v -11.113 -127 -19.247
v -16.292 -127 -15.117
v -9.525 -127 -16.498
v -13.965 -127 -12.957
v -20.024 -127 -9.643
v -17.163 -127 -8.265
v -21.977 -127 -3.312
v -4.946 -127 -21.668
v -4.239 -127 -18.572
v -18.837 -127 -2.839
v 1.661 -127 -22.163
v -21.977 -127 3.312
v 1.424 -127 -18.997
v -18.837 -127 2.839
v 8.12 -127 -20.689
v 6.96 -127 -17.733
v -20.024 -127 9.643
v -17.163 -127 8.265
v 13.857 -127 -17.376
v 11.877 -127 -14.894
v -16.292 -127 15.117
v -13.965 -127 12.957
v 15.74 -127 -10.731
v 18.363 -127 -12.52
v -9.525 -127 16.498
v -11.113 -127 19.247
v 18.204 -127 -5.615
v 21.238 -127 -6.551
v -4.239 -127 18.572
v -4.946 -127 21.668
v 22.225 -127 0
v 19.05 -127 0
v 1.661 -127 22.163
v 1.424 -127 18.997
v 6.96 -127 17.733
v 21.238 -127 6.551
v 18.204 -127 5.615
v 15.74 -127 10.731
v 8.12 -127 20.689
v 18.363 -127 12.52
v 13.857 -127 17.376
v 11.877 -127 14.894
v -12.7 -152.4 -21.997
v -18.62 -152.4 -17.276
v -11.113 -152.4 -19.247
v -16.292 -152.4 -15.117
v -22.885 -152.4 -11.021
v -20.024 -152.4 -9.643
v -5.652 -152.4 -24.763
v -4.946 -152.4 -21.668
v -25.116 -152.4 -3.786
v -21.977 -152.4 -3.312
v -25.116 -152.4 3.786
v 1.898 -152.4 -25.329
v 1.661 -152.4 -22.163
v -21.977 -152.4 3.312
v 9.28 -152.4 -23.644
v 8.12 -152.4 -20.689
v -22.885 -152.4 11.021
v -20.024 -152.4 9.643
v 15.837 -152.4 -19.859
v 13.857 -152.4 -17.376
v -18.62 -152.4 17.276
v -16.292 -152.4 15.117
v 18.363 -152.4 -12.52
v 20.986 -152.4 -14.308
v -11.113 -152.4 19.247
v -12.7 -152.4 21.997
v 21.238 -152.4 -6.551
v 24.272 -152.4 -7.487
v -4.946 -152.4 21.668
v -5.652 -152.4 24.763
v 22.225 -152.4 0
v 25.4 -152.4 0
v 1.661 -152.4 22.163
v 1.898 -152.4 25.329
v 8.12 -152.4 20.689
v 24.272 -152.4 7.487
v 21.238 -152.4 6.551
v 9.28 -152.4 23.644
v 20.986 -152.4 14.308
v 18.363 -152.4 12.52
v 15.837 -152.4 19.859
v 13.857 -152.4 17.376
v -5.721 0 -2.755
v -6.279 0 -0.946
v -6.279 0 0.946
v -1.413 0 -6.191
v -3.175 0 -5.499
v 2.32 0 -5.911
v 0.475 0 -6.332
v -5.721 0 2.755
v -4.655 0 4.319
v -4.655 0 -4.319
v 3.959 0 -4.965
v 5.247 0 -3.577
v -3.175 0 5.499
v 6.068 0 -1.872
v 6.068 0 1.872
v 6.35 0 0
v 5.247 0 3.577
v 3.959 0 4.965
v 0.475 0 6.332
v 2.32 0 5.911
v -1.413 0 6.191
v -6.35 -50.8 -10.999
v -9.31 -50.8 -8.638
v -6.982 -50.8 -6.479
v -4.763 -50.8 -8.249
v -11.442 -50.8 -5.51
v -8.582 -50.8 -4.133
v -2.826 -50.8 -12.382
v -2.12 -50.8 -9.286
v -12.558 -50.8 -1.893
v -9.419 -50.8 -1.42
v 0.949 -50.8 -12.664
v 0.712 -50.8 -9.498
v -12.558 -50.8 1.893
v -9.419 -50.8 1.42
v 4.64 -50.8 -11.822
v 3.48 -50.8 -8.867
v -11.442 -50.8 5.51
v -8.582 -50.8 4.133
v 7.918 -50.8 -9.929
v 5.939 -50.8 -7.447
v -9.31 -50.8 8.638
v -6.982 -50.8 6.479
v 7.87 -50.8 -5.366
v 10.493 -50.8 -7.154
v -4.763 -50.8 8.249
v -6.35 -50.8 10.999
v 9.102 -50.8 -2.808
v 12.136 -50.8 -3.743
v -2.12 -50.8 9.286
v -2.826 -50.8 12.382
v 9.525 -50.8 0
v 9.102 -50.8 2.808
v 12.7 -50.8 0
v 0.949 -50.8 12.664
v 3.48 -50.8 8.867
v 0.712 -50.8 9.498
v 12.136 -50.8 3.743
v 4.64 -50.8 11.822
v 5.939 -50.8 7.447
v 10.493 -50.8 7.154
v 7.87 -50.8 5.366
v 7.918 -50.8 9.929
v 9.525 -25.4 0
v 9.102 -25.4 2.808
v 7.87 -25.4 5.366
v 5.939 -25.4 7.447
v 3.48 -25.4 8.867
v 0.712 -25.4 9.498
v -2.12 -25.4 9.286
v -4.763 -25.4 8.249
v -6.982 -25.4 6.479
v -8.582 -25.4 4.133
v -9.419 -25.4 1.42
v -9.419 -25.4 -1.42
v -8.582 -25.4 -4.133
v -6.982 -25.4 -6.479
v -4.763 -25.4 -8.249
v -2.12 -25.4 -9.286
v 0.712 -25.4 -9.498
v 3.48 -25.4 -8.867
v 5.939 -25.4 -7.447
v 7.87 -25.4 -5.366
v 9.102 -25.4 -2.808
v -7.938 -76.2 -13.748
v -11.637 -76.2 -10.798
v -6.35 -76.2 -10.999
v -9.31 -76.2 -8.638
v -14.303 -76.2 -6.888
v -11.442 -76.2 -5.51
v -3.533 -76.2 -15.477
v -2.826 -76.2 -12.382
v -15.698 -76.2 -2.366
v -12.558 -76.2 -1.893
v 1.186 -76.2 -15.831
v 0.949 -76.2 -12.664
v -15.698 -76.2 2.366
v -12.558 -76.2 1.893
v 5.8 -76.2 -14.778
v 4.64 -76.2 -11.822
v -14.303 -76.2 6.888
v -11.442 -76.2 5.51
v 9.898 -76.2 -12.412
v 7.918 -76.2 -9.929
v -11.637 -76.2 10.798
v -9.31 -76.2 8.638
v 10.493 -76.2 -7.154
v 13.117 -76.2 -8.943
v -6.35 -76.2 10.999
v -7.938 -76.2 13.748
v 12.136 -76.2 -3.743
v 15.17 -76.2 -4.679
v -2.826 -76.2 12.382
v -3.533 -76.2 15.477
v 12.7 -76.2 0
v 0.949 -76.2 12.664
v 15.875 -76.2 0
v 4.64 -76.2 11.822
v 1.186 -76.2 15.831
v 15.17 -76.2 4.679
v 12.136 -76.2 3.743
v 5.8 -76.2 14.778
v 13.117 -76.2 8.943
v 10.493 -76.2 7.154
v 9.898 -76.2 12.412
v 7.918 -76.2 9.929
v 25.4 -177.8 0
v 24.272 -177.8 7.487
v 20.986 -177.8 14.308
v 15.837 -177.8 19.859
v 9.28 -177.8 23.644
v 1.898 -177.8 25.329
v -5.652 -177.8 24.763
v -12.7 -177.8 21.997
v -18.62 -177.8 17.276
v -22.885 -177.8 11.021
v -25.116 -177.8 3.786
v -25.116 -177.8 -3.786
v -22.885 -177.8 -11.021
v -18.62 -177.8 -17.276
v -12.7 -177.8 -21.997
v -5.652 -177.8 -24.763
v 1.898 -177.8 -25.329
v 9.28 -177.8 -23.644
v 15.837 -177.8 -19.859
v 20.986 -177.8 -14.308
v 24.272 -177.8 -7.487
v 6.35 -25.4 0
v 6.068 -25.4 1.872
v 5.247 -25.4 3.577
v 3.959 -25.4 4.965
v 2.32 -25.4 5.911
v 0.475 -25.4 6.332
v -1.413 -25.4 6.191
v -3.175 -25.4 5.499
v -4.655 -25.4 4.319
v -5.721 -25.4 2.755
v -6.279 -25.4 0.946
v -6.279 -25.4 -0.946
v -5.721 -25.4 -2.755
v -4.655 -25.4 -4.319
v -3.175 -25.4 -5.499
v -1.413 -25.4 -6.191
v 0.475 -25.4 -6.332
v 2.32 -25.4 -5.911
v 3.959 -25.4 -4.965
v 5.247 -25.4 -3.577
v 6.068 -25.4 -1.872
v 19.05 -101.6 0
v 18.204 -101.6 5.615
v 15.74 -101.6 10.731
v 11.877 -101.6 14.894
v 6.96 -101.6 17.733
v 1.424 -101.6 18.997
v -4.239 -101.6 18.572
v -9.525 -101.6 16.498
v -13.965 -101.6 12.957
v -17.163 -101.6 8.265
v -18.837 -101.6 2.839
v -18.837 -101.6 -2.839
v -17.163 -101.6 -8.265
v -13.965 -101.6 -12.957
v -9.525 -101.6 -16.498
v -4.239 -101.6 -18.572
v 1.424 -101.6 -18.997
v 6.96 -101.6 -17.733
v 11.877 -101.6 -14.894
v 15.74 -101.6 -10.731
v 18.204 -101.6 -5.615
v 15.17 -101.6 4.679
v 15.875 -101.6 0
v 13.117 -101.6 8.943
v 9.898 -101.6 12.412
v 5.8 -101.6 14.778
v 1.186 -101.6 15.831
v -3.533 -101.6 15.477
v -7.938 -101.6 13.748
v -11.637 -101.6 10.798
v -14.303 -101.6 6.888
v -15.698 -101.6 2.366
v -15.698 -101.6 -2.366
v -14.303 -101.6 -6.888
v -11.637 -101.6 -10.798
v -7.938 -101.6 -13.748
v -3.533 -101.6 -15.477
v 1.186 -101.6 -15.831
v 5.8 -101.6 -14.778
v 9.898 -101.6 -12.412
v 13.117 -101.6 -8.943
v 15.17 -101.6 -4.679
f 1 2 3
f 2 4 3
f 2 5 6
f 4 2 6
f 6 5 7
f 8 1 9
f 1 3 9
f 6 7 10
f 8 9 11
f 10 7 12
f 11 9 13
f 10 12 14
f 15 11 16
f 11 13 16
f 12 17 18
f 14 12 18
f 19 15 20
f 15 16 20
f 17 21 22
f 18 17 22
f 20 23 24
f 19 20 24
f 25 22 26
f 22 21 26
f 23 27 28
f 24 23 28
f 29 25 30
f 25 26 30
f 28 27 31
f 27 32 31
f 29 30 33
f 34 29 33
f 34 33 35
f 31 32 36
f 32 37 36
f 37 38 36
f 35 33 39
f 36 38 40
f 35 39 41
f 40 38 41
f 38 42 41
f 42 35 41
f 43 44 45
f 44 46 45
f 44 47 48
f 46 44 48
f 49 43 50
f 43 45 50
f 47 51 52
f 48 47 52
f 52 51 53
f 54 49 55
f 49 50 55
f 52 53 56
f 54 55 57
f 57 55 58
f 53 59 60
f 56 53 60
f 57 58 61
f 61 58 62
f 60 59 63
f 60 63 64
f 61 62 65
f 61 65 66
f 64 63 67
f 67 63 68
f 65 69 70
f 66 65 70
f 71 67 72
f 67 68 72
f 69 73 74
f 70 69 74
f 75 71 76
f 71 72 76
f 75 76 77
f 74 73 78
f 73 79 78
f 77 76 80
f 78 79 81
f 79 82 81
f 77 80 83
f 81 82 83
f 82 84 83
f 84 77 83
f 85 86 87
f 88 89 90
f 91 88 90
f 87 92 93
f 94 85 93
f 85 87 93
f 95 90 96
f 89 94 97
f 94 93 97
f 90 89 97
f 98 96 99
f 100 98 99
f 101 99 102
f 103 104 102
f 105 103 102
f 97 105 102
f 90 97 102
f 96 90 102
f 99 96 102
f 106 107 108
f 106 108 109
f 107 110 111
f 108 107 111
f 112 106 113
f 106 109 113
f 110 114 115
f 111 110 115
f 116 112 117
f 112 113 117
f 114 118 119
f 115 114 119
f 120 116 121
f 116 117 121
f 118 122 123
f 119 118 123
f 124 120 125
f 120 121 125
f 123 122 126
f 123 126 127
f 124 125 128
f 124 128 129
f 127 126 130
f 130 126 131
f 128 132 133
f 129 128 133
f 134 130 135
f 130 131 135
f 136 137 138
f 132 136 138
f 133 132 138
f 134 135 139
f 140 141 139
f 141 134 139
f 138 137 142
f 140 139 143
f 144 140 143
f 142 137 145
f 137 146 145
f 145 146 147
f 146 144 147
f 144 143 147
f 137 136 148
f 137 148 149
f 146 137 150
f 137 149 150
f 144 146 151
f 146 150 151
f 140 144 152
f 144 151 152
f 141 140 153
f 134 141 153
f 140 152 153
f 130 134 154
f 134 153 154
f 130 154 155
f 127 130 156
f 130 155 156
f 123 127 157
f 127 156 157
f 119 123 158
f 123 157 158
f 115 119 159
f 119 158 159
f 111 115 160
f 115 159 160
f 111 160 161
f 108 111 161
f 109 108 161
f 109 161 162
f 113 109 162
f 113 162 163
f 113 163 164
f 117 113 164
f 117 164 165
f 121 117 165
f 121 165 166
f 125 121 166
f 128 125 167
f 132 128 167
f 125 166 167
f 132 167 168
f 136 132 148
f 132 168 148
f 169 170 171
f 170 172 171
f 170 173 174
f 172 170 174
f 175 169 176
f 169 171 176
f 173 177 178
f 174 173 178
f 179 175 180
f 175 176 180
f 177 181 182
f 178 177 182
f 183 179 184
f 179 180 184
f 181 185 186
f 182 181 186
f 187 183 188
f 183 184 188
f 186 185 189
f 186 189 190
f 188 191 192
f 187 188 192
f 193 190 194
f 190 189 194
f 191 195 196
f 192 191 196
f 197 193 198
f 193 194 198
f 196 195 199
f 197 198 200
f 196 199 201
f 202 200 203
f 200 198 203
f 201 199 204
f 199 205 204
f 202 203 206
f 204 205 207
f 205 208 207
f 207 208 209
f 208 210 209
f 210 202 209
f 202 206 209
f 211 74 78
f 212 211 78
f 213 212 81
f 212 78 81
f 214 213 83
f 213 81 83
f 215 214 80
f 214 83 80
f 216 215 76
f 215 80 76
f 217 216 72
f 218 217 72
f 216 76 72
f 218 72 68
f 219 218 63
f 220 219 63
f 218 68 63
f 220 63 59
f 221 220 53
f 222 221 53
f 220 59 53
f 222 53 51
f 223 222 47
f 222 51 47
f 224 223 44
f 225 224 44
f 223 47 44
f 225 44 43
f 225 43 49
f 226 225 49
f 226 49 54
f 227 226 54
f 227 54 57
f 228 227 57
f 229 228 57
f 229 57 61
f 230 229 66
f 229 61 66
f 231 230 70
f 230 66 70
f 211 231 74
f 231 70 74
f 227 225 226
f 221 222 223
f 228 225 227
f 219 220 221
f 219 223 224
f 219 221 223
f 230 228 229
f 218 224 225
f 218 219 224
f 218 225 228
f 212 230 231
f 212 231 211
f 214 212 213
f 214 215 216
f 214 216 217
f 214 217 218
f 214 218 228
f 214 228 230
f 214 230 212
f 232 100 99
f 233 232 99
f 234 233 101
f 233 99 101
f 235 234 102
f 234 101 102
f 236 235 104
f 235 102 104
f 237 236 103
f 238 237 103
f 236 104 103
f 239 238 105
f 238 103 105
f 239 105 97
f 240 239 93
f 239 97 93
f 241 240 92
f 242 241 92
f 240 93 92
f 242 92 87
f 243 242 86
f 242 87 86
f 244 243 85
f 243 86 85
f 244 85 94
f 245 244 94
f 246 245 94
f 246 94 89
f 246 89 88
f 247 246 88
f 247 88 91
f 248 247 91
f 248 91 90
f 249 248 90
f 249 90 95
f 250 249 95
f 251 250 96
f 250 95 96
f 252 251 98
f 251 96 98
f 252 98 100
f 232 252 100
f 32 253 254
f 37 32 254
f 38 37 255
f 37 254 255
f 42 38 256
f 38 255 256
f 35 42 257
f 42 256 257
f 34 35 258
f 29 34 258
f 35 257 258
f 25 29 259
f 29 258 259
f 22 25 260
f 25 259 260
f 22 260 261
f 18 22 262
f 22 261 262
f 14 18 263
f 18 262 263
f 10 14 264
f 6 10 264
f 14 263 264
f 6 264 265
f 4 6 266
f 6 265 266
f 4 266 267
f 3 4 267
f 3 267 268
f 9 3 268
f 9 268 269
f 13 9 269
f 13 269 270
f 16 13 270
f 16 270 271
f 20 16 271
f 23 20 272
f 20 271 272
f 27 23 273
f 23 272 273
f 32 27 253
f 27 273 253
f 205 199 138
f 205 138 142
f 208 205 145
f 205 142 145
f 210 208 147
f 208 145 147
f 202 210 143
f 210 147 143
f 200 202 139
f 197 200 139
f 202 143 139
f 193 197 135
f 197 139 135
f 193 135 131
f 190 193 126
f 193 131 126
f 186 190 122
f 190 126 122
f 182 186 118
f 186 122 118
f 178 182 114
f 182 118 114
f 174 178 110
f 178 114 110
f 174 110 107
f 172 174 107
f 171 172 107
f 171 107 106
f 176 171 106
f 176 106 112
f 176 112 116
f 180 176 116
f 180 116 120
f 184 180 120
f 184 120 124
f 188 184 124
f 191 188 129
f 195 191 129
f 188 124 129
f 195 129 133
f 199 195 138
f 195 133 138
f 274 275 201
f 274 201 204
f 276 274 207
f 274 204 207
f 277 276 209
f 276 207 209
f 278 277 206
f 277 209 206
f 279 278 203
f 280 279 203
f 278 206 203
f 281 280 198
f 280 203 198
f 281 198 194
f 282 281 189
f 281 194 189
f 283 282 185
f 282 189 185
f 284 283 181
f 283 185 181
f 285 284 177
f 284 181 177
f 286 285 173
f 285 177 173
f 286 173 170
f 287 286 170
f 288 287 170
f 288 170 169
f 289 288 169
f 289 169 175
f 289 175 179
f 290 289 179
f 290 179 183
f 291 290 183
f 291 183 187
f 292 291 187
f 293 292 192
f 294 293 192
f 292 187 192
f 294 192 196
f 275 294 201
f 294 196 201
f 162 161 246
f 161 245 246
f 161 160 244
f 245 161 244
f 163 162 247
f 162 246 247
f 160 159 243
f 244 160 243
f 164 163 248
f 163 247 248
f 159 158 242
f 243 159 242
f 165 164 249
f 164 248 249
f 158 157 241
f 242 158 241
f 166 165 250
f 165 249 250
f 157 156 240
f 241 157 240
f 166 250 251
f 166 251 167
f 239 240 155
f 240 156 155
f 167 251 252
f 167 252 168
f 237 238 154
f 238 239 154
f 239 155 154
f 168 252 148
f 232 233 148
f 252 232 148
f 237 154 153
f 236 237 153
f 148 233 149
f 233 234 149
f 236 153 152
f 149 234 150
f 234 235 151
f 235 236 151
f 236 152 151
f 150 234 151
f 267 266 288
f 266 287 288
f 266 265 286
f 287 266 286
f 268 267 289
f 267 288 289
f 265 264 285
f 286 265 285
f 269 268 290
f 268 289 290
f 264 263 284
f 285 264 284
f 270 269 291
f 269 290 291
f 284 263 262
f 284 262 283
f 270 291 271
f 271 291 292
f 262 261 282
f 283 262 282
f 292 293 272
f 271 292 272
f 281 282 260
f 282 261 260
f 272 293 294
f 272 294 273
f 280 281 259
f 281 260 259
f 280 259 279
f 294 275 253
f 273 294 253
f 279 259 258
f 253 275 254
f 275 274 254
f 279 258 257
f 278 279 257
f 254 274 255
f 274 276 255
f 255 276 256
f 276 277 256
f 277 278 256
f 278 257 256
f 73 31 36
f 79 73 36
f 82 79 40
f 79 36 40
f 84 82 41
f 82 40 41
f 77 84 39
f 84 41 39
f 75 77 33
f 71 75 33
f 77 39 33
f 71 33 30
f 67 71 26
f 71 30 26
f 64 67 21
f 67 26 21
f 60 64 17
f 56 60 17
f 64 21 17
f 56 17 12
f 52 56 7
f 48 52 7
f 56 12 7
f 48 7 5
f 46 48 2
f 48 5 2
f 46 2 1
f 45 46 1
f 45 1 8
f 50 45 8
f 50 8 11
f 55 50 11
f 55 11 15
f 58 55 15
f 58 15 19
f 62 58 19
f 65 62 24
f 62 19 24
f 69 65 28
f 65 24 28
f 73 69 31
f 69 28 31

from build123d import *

# Parameters (mm, degrees)
F0_R      = 6.35
F1_DEPTH  = 25.4
F2_R      = 9.525
F3_DEPTH  = 25.4
F4_R      = 12.7
F5_DEPTH  = 25.4
F6_R      = 15.875
F7_DEPTH  = 25.4
F8_R      = 19.05
F9_DEPTH  = 25.4
F10_R     = 22.225
F11_DEPTH = 25.4
F12_R     = 25.4
F13_DEPTH = 25.4


with BuildPart() as f1:
    # F0 (on Front) → F1 (new body)
    with BuildSketch(Plane.XZ):
        Circle(F0_R)
    extrude(amount=F1_DEPTH)

    # F2 (on face) → F3 (join)
    with BuildSketch(Plane.XZ.offset(25.4)):
        Circle(F2_R)
    extrude(amount=F3_DEPTH)

    # F4 (on face) → F5 (join)
    with BuildSketch(Plane.XZ.offset(50.8)):
        Circle(F4_R)
    extrude(amount=F5_DEPTH)

    # F6 (on face) → F7 (join)
    with BuildSketch(Plane.XZ.offset(76.2)):
        Circle(F6_R)
    extrude(amount=F7_DEPTH)

    # F8 (on face) → F9 (join)
    with BuildSketch(Plane.XZ.offset(101.6)):
        Circle(F8_R)
    extrude(amount=F9_DEPTH)

    # F10 (on face) → F11 (join)
    with BuildSketch(Plane.XZ.offset(127)):
        Circle(F10_R)
    extrude(amount=F11_DEPTH)

    # F12 (on face) → F13 (join)
    with BuildSketch(Plane.XZ.offset(152.4)):
        Circle(F12_R)
    extrude(amount=F13_DEPTH)


solid = f1.part
